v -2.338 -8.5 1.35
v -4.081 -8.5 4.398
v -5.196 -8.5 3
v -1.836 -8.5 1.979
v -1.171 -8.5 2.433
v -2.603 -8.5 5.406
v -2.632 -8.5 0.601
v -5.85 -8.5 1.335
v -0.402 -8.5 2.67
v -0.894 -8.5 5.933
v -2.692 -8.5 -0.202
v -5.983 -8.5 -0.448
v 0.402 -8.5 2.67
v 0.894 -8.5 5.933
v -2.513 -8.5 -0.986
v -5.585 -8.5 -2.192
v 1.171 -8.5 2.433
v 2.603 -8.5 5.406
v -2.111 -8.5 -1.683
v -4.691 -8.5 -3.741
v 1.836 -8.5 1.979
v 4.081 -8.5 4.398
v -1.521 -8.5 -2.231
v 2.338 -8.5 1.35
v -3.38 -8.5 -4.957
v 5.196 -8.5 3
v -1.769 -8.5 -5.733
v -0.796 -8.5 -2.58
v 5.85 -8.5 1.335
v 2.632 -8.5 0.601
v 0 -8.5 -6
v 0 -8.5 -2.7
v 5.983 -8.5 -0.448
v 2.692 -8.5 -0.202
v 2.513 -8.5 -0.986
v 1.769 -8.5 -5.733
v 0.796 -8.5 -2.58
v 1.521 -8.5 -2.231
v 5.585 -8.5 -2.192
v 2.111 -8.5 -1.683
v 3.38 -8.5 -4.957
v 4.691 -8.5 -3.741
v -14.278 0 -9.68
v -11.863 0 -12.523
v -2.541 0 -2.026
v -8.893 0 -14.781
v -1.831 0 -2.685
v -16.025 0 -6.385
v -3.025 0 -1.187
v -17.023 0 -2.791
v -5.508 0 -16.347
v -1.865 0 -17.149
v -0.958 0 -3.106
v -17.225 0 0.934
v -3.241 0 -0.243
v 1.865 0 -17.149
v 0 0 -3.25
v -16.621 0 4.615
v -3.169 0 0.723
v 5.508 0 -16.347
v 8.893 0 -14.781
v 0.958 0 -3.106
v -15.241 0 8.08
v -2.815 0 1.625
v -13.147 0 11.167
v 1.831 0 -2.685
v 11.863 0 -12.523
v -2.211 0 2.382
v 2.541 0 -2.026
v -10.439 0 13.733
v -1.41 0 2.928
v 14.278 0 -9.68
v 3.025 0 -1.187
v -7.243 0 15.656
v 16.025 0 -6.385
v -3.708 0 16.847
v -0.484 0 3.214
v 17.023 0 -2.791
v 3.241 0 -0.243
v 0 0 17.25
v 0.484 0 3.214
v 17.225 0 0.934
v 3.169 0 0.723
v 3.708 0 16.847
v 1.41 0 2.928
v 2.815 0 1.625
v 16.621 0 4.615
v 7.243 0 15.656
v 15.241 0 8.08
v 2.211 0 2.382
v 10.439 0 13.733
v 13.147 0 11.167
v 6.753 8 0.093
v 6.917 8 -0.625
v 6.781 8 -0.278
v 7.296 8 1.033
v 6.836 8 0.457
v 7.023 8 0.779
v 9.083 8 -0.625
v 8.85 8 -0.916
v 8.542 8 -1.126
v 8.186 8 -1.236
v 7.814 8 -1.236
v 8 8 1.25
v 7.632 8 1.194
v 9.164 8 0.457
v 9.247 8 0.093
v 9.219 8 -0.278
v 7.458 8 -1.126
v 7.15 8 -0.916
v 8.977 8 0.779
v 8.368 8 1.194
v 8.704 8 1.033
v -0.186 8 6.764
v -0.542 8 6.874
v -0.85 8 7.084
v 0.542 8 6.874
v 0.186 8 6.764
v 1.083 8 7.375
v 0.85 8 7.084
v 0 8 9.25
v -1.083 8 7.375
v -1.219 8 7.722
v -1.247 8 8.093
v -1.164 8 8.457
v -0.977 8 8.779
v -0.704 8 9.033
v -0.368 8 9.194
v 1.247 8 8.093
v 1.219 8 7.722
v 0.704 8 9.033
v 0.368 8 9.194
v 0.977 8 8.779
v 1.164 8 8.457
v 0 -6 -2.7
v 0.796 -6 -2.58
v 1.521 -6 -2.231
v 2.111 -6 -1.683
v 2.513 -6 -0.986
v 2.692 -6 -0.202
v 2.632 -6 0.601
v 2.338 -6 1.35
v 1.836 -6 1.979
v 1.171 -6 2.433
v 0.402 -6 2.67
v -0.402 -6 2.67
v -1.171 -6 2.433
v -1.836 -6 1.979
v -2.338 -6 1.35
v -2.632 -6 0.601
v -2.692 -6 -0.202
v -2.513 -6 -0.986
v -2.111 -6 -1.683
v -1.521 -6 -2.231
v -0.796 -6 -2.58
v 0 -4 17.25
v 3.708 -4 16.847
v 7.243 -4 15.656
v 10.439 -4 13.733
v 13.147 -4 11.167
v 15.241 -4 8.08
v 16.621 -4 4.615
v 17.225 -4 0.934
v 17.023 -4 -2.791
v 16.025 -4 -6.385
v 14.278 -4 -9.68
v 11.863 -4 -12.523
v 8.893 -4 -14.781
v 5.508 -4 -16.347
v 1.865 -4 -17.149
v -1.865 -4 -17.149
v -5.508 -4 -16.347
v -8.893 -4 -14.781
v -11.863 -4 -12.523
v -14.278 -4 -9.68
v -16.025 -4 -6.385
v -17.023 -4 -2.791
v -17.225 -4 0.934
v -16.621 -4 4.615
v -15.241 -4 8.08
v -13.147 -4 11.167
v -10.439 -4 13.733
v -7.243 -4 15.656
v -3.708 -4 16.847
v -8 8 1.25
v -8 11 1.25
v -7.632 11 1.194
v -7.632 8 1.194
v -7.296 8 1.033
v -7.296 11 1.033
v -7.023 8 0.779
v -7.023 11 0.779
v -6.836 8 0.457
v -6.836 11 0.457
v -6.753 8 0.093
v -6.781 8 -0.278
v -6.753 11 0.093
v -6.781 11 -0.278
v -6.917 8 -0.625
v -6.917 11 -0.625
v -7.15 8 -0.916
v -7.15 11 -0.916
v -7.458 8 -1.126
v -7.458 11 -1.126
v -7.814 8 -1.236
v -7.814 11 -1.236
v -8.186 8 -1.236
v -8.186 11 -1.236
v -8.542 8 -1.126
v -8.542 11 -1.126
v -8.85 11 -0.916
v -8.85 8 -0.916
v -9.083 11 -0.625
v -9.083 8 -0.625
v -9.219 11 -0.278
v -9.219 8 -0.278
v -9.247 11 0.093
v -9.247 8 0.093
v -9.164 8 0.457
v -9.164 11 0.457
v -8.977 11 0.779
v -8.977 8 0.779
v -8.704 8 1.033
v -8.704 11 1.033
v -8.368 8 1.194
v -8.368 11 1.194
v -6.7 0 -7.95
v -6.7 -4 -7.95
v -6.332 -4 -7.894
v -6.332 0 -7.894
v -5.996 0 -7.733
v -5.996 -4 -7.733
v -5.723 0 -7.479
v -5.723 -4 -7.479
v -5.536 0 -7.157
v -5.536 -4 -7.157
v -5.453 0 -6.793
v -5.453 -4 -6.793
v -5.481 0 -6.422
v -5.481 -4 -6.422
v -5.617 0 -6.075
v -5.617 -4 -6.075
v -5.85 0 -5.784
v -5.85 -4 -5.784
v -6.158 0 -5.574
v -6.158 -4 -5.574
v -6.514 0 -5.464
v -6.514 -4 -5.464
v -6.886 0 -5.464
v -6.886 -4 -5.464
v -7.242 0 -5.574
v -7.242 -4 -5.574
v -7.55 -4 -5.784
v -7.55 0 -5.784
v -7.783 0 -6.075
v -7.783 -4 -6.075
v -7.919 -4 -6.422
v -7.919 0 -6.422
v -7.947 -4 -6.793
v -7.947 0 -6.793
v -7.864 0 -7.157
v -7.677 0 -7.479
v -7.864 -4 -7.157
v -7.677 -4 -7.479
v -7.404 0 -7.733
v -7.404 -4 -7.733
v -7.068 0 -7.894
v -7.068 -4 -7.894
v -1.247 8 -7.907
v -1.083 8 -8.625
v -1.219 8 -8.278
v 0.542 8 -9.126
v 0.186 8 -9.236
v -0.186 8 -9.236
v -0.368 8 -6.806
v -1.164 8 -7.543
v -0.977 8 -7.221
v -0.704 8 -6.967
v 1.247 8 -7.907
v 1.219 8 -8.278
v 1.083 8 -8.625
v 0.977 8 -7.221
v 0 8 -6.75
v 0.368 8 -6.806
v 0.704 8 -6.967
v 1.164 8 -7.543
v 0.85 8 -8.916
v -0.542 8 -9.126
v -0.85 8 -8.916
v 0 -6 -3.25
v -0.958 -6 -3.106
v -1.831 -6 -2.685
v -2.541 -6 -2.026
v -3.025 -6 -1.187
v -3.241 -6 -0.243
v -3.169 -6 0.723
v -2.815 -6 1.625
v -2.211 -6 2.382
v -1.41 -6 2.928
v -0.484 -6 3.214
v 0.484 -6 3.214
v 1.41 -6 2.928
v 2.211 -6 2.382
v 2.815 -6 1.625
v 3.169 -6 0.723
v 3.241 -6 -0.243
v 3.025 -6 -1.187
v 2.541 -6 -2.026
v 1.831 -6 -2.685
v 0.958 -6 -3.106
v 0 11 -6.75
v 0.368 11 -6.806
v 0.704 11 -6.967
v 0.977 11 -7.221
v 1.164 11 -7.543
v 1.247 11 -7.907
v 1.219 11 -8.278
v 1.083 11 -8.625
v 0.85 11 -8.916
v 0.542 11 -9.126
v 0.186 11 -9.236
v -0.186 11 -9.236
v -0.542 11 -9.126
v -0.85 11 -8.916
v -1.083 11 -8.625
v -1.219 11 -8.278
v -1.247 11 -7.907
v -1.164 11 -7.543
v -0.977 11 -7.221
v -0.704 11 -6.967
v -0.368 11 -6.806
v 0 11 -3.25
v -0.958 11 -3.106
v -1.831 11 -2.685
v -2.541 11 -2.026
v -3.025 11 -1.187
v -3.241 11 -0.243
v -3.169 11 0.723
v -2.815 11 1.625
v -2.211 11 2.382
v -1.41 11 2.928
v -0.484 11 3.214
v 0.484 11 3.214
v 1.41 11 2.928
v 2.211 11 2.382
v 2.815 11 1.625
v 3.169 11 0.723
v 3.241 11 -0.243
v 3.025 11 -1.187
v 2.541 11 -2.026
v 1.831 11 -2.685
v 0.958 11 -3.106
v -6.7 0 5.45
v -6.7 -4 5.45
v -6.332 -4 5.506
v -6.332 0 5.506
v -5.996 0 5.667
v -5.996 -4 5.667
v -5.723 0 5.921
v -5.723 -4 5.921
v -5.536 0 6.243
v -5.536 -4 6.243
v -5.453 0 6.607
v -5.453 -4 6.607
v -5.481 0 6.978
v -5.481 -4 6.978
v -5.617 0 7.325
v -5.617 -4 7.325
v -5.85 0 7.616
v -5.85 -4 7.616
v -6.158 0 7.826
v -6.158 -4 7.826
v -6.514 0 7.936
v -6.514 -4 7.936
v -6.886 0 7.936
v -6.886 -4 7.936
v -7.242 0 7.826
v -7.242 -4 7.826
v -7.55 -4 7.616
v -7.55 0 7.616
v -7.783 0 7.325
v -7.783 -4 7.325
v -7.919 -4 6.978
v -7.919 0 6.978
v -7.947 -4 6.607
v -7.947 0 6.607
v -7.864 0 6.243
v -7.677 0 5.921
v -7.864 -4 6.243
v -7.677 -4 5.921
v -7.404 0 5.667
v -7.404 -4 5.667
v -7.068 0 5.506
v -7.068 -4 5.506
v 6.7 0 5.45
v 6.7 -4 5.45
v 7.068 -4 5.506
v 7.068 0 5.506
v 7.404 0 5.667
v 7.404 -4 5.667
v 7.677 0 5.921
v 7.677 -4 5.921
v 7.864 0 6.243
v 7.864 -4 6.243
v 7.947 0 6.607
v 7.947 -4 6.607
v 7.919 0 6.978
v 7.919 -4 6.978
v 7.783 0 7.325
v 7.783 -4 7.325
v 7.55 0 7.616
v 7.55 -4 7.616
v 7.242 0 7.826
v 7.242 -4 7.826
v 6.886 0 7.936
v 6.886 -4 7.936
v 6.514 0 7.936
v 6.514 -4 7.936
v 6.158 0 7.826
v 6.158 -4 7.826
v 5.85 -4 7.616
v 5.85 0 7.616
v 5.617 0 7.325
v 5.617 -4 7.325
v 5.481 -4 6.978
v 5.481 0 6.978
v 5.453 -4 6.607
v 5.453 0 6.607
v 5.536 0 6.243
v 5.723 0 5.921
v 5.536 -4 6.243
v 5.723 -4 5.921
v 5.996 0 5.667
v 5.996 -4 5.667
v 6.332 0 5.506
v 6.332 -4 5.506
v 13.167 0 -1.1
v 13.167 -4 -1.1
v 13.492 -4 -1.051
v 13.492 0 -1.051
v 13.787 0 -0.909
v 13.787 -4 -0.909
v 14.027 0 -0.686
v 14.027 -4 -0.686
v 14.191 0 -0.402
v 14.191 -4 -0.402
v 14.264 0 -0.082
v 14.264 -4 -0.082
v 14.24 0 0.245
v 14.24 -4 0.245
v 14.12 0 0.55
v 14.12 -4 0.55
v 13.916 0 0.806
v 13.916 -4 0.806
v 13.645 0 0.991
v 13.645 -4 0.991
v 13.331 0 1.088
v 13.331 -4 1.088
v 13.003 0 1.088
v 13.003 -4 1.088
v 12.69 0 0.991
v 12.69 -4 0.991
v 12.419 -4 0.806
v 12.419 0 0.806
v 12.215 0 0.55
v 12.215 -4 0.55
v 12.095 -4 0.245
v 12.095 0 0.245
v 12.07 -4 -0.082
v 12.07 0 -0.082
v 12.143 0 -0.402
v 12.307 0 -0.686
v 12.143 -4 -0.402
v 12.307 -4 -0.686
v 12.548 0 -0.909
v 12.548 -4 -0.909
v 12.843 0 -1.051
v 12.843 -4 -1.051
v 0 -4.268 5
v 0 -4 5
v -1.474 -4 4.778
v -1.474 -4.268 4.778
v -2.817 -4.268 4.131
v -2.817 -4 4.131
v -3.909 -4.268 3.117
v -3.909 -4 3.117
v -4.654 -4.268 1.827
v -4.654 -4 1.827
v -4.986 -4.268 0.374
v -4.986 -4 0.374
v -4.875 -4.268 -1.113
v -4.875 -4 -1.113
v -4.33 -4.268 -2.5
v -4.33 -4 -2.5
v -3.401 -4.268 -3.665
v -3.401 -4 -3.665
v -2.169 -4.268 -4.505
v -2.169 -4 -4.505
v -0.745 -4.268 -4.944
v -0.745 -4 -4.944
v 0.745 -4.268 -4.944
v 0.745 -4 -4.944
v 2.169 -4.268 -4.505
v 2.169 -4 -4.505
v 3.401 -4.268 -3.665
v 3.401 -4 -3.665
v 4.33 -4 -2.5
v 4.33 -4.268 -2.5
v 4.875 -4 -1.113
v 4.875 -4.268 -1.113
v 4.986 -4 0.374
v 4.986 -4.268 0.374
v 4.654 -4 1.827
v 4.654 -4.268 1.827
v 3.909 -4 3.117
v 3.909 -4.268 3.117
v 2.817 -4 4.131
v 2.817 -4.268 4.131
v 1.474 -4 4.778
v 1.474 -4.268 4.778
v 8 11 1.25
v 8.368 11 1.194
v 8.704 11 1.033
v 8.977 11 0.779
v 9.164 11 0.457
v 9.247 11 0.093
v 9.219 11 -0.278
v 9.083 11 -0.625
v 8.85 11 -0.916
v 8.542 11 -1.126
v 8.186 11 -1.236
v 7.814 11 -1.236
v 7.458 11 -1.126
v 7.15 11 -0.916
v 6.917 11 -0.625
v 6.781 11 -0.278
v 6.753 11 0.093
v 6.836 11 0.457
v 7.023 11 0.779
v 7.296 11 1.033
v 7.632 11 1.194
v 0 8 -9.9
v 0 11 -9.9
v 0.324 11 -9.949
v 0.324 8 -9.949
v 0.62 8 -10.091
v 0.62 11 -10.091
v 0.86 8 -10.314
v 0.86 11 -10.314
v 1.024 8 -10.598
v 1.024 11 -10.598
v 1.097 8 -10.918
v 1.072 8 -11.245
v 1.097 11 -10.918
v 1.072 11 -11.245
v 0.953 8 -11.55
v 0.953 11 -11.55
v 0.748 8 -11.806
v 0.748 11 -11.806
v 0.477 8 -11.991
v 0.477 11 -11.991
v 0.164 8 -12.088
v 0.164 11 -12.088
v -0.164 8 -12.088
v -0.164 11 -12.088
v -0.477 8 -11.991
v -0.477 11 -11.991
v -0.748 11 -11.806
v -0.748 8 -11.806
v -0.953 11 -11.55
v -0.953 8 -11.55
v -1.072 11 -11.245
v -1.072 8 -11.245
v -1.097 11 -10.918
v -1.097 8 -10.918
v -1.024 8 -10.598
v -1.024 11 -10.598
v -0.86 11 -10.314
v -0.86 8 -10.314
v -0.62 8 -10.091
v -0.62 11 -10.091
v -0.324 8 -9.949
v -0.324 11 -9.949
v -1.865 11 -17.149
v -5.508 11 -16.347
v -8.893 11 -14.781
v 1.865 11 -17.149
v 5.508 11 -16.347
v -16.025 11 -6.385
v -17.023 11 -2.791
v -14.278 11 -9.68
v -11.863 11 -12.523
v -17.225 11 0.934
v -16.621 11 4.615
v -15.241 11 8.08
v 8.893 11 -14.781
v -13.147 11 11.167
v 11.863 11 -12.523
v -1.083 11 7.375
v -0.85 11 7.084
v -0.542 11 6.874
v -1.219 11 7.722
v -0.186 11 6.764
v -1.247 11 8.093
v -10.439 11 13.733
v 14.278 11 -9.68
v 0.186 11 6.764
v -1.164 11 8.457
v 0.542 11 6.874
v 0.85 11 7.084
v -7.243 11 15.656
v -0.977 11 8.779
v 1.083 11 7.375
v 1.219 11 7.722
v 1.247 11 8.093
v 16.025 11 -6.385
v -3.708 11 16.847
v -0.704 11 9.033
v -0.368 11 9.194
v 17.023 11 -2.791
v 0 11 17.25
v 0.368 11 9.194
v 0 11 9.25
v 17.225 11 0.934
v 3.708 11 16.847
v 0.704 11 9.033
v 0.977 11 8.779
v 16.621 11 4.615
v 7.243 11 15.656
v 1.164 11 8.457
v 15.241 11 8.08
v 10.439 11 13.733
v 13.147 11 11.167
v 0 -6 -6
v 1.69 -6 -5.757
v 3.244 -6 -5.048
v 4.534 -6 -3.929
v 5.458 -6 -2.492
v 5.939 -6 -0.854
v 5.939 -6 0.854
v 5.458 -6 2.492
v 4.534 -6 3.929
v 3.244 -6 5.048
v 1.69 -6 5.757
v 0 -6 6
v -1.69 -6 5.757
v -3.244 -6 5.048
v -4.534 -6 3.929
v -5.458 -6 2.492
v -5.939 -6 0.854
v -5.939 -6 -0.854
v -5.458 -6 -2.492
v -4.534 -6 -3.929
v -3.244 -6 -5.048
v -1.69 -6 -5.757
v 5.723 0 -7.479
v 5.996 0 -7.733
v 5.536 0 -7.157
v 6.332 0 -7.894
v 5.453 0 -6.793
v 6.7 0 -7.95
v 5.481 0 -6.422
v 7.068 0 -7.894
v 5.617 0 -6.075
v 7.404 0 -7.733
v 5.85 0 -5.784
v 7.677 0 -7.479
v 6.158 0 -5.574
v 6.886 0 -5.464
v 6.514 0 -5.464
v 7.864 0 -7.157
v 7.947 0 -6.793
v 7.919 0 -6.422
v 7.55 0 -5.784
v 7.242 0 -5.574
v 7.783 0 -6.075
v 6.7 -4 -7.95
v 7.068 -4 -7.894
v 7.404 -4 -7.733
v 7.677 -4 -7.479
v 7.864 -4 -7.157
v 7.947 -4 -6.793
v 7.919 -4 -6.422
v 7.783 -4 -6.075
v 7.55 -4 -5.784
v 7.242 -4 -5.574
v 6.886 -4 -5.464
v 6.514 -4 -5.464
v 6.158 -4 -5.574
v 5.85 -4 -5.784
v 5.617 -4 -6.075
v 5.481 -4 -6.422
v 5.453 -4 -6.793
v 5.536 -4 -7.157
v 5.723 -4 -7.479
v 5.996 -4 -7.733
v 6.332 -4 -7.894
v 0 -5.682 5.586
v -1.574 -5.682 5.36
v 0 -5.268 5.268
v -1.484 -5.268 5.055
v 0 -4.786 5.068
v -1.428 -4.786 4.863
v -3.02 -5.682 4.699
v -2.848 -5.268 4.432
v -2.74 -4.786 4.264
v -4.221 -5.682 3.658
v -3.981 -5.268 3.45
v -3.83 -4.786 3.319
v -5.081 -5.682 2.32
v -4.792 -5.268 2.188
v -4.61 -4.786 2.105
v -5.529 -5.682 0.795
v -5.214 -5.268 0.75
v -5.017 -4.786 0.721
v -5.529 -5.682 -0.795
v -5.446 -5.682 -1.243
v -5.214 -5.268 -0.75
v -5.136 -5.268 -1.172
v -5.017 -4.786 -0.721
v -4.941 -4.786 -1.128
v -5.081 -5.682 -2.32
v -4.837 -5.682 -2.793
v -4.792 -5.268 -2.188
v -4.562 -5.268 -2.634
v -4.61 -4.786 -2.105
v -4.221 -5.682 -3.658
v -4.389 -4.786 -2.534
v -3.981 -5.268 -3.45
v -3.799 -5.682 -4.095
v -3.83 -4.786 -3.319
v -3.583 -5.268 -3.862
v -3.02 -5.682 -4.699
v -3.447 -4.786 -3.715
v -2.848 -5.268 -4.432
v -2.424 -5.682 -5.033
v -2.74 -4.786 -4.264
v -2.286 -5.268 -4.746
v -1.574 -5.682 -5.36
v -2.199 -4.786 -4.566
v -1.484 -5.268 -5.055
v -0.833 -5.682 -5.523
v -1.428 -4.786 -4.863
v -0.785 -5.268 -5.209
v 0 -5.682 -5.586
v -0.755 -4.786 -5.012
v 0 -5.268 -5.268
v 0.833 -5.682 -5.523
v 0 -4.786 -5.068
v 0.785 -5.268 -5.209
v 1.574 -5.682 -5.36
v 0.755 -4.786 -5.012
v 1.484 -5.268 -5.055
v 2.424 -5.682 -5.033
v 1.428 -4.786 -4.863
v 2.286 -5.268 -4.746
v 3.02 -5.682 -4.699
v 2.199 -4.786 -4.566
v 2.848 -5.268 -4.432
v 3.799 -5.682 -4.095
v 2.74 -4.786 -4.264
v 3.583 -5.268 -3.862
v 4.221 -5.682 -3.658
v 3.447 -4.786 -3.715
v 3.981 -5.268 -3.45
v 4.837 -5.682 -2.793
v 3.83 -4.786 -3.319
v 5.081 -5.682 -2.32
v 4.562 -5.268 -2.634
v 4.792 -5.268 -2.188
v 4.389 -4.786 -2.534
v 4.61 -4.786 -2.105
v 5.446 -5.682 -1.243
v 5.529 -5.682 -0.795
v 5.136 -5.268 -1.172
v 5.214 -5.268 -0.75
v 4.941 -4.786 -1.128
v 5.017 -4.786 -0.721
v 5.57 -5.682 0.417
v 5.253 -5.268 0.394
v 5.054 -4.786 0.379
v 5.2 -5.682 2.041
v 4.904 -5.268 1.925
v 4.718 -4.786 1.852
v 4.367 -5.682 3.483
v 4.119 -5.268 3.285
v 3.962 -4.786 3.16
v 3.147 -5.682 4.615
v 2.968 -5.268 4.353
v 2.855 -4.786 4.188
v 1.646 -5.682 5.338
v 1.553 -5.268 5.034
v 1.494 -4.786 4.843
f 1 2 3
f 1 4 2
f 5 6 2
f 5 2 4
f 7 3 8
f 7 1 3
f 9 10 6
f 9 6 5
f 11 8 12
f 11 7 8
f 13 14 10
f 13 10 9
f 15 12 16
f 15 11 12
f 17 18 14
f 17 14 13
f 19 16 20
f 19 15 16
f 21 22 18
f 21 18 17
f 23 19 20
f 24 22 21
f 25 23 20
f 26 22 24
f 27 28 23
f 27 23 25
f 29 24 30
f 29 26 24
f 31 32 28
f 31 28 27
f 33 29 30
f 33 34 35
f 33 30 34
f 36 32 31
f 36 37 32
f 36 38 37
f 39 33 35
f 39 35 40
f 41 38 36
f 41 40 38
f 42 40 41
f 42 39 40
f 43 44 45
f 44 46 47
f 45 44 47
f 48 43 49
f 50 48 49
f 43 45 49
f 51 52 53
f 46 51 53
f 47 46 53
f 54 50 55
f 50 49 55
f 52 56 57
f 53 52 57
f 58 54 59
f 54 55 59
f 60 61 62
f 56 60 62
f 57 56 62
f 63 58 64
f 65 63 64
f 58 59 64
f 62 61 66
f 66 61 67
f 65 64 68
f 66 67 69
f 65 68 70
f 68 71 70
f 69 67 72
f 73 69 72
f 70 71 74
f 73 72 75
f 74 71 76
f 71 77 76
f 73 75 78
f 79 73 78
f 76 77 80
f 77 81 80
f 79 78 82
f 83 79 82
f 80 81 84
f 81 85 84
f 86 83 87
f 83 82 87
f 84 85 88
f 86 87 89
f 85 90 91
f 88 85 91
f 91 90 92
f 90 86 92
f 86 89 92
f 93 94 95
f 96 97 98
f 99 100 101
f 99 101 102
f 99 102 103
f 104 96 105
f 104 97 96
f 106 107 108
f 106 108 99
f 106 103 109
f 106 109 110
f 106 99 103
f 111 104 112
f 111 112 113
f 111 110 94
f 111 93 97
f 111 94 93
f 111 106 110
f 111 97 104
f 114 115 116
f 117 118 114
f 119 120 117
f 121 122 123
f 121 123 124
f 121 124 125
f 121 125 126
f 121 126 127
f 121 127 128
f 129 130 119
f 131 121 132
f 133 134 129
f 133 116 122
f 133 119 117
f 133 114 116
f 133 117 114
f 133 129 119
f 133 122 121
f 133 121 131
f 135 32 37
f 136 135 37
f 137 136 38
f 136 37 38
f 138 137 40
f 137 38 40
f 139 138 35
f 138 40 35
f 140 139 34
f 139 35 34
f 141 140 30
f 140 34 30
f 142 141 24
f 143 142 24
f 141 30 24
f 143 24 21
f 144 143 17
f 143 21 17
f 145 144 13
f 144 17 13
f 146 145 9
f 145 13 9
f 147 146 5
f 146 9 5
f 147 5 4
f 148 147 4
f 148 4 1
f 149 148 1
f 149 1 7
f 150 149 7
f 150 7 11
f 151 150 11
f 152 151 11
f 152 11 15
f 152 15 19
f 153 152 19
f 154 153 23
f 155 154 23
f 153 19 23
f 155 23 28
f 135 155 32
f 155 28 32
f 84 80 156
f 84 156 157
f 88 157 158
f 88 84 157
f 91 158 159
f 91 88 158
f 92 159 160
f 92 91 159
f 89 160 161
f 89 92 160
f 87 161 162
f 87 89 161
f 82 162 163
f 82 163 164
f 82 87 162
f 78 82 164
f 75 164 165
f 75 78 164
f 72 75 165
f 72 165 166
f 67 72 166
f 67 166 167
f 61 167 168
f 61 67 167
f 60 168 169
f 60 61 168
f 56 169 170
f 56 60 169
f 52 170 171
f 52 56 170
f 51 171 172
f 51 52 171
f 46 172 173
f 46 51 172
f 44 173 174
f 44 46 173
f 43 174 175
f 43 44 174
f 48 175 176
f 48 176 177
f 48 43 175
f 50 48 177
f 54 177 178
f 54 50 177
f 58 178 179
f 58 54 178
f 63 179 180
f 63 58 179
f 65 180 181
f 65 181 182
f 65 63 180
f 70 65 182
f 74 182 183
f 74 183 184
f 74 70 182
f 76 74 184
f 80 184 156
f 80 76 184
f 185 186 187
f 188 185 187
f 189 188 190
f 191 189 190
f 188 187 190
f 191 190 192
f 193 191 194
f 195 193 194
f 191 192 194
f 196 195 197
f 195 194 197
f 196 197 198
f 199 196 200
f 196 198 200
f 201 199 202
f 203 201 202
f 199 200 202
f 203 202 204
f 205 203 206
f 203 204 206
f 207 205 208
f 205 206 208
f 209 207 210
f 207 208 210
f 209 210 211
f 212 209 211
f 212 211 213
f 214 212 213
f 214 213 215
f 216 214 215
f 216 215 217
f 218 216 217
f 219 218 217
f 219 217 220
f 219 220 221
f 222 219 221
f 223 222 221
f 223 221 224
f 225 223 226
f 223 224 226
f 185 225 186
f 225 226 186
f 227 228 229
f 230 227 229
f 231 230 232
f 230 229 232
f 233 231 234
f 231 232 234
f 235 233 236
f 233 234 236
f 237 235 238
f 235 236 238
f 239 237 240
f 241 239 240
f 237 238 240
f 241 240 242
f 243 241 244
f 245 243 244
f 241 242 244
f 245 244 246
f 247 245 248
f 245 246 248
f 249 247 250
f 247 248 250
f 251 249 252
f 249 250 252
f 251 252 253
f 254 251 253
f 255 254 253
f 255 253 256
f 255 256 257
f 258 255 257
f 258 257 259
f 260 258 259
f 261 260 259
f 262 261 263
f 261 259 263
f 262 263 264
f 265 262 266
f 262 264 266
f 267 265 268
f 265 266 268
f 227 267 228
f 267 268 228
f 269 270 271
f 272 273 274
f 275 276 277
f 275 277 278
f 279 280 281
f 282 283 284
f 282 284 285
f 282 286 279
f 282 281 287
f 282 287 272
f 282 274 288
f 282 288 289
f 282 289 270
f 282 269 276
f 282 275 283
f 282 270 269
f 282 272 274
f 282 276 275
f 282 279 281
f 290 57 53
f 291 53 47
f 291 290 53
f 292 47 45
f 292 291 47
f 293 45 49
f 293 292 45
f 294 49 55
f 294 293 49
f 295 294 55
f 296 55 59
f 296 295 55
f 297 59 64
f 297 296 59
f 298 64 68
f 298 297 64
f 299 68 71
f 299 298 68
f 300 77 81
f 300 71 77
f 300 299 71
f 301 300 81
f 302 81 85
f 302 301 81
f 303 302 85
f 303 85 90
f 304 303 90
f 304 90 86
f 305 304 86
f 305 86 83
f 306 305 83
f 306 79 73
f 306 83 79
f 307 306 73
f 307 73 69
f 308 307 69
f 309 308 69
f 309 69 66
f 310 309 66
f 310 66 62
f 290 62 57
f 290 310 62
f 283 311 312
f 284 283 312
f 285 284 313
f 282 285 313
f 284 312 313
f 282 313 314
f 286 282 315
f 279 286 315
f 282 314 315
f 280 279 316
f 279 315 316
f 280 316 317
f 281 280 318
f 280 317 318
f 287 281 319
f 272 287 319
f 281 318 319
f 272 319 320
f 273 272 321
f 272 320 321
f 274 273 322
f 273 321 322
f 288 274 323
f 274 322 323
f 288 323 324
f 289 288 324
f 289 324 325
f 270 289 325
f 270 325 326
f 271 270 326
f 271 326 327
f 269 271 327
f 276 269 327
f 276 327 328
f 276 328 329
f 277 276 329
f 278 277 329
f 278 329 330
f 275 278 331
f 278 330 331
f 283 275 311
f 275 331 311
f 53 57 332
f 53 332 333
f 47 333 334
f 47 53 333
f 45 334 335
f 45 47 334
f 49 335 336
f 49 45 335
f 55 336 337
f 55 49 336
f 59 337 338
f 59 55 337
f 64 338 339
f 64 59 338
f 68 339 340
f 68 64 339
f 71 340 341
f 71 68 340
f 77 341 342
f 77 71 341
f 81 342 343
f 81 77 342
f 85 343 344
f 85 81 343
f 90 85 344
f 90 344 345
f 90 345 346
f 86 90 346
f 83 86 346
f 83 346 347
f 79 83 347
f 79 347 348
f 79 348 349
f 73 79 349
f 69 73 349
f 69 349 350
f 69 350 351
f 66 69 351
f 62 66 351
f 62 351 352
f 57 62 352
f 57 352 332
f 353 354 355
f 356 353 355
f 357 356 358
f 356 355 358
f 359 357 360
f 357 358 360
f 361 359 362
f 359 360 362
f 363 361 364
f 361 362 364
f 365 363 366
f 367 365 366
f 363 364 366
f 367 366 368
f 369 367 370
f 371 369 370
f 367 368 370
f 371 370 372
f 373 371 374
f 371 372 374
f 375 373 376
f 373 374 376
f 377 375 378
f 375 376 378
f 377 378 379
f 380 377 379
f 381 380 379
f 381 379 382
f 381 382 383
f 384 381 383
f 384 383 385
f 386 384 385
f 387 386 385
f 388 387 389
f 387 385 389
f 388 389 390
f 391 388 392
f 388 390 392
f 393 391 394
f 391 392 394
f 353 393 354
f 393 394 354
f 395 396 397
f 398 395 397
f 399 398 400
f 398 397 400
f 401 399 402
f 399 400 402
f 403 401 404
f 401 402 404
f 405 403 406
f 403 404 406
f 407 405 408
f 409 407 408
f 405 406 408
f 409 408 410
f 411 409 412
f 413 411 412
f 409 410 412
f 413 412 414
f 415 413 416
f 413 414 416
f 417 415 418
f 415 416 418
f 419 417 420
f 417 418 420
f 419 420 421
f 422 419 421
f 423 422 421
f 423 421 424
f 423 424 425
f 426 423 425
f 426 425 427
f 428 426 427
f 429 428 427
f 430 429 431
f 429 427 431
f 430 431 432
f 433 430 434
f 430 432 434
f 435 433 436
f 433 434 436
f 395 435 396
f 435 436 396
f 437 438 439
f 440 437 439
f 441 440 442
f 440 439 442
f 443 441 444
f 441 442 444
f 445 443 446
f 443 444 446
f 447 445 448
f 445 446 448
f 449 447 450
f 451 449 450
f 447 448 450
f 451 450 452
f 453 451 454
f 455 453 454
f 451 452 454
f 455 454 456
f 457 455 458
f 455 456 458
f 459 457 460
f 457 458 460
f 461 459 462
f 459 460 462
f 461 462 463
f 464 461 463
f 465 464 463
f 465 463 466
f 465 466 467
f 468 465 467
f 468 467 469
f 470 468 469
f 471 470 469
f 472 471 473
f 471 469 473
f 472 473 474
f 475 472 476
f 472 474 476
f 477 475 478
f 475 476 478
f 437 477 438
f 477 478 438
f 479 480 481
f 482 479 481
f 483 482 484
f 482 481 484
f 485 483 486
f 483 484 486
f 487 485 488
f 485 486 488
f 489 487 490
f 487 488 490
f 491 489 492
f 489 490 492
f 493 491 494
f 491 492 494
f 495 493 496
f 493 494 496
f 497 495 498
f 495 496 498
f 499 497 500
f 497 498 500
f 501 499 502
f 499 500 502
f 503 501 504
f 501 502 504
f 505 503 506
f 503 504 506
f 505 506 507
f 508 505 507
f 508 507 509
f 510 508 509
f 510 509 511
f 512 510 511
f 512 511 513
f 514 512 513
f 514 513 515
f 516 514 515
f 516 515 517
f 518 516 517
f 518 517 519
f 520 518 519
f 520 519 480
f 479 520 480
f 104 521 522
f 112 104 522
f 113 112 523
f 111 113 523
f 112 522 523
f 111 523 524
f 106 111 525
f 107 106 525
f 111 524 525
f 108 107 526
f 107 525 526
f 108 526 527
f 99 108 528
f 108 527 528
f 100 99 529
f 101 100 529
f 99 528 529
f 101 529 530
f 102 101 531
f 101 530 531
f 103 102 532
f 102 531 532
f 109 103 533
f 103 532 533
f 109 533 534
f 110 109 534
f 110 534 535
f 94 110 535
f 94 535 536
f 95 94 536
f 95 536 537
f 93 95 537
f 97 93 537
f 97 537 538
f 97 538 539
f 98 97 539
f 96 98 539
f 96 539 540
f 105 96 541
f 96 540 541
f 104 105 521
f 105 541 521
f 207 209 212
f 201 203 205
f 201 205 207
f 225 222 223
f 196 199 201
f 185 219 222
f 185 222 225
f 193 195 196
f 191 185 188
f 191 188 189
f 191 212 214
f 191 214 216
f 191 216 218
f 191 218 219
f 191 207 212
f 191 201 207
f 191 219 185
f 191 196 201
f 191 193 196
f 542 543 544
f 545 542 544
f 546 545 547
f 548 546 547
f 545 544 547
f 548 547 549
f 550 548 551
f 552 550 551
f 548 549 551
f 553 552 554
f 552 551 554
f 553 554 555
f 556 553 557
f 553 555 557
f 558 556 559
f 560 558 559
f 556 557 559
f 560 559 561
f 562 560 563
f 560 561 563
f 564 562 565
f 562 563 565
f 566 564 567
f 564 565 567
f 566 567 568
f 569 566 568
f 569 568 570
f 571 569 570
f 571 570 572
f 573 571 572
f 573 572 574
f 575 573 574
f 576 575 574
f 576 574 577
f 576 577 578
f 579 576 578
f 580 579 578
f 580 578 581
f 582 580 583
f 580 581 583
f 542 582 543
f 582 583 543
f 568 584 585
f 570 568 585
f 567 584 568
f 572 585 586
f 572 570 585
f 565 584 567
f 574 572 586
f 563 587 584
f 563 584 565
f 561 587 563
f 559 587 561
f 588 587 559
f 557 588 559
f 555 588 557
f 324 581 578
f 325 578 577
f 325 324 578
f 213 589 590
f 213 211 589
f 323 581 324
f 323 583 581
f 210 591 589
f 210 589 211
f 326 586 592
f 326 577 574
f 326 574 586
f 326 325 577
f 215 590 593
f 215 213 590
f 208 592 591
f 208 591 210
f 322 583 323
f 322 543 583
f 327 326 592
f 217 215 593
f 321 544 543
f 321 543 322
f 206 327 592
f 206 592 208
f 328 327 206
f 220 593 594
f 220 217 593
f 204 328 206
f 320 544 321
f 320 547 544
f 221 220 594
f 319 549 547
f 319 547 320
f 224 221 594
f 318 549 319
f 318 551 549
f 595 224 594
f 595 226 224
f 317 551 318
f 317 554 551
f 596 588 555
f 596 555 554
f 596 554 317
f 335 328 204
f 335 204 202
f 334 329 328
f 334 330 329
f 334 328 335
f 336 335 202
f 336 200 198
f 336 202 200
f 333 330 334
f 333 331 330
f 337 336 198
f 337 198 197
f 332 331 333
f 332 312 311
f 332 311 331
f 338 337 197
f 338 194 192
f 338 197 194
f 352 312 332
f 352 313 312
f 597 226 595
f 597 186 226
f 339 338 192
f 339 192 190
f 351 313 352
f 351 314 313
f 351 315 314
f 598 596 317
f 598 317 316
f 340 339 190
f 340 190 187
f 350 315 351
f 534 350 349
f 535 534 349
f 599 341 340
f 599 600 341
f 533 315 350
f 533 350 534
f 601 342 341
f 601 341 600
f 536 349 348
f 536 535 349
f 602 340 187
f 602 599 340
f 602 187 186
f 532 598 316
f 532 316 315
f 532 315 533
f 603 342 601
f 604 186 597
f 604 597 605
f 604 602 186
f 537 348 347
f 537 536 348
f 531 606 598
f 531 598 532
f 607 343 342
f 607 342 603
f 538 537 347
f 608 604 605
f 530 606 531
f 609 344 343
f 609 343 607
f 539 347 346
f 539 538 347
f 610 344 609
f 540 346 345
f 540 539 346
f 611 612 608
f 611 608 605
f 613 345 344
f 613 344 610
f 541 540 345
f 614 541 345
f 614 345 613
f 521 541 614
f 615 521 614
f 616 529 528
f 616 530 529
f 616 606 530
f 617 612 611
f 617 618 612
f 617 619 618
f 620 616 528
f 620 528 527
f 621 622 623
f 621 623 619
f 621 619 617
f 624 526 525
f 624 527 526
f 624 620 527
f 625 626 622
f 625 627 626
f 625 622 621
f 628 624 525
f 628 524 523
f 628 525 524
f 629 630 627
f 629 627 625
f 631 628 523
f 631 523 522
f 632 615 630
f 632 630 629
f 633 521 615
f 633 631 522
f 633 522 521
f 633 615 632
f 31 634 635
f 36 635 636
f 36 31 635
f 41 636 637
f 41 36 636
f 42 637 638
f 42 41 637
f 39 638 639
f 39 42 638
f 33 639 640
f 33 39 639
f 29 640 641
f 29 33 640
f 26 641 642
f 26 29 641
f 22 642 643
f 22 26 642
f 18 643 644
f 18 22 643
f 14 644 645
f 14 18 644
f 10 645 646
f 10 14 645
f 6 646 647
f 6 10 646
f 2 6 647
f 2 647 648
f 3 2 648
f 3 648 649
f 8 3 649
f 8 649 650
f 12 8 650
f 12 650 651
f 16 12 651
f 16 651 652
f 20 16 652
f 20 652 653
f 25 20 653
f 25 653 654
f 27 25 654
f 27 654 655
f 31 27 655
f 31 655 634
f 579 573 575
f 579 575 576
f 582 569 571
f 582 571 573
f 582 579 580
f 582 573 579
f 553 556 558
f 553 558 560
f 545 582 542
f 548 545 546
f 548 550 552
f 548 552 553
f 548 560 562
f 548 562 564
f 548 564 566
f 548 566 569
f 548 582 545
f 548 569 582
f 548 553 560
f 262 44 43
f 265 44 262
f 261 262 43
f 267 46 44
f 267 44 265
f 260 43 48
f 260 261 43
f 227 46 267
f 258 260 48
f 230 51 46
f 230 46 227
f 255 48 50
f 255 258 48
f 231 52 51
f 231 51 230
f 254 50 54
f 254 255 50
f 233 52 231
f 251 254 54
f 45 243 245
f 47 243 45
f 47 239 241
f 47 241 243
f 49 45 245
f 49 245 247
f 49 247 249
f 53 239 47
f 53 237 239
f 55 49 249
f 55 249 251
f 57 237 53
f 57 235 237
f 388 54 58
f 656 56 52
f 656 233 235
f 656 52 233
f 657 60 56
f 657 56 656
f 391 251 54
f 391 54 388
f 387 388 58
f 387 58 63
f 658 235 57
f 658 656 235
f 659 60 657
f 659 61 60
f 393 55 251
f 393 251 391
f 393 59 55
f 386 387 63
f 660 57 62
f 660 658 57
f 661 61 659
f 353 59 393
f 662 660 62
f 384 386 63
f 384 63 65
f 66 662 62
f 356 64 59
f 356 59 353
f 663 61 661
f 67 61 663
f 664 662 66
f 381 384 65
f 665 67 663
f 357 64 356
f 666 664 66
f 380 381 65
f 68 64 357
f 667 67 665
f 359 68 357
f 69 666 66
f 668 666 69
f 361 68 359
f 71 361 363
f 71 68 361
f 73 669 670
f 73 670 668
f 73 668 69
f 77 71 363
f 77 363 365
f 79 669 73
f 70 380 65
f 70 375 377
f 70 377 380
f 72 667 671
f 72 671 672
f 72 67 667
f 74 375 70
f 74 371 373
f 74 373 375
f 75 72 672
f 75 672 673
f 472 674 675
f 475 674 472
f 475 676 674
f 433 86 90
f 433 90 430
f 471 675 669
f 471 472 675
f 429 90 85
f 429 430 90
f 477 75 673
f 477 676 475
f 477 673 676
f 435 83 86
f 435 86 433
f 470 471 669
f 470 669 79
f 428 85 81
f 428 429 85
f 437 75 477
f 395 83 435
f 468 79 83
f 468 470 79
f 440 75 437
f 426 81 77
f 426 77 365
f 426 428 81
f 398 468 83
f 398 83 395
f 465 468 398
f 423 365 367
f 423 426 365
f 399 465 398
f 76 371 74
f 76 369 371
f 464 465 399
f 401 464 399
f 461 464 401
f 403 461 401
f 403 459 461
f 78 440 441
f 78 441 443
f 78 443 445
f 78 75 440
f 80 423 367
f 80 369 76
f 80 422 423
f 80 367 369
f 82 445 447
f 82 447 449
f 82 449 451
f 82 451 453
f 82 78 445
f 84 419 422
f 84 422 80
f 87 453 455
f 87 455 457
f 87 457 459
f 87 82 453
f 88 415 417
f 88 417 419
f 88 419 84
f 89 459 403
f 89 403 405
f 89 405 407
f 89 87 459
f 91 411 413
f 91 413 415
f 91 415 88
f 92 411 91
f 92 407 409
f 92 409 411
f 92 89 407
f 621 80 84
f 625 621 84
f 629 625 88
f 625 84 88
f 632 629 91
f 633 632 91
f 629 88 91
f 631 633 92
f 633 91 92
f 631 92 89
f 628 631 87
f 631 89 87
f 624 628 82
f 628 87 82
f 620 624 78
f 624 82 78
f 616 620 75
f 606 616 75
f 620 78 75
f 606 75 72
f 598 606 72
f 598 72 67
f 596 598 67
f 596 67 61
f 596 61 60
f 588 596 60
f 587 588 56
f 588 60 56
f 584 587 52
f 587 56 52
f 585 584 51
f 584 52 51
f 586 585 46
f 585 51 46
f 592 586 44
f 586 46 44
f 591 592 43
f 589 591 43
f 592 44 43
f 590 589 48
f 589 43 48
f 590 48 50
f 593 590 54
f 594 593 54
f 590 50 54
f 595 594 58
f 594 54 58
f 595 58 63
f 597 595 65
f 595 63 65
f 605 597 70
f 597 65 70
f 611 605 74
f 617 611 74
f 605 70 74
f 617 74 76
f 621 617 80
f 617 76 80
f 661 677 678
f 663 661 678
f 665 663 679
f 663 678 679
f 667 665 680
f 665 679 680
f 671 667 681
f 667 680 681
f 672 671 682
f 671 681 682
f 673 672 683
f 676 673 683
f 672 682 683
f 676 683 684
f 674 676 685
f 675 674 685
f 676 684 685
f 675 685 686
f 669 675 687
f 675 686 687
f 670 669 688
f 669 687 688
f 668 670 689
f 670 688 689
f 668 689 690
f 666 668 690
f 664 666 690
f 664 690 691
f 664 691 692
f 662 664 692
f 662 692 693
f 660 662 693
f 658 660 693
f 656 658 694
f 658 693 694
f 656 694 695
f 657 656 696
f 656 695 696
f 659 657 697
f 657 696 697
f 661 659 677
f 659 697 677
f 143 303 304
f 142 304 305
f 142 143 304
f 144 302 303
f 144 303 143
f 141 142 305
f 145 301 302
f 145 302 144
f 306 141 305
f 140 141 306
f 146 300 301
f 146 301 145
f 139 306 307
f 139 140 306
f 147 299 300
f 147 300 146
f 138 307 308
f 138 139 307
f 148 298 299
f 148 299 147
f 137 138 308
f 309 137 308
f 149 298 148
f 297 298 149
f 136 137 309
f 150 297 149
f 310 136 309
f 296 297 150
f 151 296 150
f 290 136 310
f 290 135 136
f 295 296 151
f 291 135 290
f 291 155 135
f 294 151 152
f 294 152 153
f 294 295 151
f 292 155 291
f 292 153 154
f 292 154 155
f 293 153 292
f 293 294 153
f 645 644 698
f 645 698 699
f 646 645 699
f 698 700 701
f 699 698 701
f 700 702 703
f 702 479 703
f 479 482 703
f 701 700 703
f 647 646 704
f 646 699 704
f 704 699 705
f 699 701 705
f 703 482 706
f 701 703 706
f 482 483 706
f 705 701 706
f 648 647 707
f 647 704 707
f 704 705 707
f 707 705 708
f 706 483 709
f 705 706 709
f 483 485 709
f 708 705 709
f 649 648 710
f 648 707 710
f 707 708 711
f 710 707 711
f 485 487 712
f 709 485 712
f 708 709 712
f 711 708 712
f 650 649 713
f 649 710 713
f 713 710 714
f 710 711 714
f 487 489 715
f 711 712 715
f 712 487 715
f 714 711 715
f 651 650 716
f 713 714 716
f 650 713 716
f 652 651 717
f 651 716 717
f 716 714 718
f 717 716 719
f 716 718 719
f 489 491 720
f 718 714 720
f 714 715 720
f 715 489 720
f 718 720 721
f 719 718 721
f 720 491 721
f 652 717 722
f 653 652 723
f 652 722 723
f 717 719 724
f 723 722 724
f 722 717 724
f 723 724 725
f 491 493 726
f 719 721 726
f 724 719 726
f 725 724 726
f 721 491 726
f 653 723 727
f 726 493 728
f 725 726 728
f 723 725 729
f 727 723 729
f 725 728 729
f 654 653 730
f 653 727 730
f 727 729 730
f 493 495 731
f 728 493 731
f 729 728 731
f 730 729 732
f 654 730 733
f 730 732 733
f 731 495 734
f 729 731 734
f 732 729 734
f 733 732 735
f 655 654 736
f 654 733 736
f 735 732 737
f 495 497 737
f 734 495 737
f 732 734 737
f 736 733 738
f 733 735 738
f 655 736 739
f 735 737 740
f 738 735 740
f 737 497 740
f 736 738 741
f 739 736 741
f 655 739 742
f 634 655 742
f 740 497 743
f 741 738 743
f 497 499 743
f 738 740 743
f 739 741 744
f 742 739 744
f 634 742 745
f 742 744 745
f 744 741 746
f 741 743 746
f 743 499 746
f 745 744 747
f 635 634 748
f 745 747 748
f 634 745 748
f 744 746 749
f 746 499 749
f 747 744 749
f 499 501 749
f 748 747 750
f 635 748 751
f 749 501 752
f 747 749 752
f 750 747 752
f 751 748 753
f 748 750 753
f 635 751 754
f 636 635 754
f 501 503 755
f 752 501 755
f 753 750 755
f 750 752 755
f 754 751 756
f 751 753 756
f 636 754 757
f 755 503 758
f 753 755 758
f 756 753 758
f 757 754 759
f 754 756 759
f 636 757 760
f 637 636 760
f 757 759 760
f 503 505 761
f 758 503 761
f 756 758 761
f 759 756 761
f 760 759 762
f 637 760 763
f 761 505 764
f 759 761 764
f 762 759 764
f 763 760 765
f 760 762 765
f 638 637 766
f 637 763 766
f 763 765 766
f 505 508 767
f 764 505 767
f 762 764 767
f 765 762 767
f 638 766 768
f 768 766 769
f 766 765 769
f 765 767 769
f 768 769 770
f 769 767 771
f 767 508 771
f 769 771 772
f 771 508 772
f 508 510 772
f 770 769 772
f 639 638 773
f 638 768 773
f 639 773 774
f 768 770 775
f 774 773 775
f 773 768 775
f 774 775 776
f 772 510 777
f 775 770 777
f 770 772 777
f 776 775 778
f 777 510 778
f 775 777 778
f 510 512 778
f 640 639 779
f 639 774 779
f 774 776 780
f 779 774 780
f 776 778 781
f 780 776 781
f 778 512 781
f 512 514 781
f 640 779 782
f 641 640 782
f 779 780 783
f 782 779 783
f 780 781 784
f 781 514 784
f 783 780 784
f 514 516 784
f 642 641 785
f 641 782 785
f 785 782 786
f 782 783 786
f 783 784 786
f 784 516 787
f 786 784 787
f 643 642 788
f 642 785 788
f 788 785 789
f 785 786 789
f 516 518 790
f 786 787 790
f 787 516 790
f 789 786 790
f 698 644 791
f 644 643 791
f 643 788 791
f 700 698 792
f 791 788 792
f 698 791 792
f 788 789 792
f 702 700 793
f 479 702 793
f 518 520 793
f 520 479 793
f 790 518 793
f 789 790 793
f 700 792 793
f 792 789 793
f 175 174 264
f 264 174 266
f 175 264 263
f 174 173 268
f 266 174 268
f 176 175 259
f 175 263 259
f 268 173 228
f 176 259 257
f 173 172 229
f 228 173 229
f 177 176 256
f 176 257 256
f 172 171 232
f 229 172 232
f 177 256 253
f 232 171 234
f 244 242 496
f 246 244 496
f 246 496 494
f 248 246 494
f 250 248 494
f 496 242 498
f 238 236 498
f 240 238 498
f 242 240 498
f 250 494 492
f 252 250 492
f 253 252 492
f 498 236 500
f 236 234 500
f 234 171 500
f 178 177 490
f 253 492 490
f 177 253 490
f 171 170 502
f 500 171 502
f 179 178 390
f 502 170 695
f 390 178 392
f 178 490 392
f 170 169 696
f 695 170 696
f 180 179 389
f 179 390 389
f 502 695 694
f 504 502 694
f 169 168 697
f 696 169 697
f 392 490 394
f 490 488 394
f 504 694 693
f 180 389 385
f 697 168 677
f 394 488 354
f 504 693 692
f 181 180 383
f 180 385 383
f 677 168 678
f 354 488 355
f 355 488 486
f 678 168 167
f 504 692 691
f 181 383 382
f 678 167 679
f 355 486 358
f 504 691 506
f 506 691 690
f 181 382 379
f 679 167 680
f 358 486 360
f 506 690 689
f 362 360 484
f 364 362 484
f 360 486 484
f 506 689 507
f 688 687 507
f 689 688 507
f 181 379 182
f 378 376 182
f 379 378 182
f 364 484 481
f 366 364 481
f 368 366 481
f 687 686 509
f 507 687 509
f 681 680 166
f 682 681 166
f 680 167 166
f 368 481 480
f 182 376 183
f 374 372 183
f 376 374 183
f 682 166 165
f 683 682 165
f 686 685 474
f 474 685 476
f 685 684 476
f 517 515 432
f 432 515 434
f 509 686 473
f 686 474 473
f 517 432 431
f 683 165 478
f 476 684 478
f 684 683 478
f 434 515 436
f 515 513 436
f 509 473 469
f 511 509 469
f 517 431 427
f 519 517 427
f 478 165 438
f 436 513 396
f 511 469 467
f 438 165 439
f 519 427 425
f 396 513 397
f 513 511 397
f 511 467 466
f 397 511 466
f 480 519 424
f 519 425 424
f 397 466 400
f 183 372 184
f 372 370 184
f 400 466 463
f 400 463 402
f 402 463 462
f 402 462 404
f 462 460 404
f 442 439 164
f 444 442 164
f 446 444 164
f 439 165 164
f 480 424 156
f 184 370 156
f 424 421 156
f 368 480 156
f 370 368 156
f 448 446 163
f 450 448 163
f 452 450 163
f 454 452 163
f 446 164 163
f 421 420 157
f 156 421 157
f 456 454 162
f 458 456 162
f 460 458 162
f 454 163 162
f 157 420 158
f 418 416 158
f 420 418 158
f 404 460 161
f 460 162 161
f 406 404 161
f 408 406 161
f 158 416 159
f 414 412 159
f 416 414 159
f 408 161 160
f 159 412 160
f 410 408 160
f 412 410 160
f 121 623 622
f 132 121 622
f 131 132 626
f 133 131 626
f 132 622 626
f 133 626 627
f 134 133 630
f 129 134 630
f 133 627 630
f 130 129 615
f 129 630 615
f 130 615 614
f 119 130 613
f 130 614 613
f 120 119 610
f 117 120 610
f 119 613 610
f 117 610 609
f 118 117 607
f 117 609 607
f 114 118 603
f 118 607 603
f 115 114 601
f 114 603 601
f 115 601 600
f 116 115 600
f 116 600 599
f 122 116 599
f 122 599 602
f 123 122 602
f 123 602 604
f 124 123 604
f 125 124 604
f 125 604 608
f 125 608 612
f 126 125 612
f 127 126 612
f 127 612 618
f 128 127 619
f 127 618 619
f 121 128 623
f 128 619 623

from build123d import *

# Parameters (mm, degrees)
SKETCH1_R           = 17.25
BOSS_EXTRUDE1_DEPTH = 11
SKETCH2_R           = 1.25
SKETCH2_R_2         = 1.1
CUT_EXTRUDE1_DEPTH  = 3
SKETCH1_2_R         = 17.25
BOSS_EXTRUDE2_DEPTH = 4
SKETCH4_R           = 1.25
SKETCH4_R_2         = 1.1
CUT_EXTRUDE3_DEPTH  = 4
SKETCH5_R           = 5
BOSS_EXTRUDE3_DEPTH = 4.5
BOSS_EXTRUDE4_START = 4.5
SKETCH5_3_R         = 6
SKETCH5_3_R_2       = 5
BOSS_EXTRUDE4_DEPTH = 2.5
CUT_EXTRUDE4_START  = 4.5
SKETCH5_5_R         = 2.7
CUT_EXTRUDE4_DEPTH  = 2.5
CUT_EXTRUDE5_START  = -6
SKETCH6_R           = 3.25
CUT_EXTRUDE5_DEPTH  = 17
FILLET1_R           = 2


with BuildPart() as part:
    # Sketch1 → Boss-Extrude1 (new body)
    with BuildSketch(Plane(origin=(0, 0, 0), x_dir=(1, 0, 0), z_dir=(0, 1, 0))):
        with Locations(Location((0, 0, 0), (0, 0, 270))):
            Circle(SKETCH1_R)
    extrude(amount=BOSS_EXTRUDE1_DEPTH)

    # Sketch2 → Cut-Extrude1 (cut)
    with BuildSketch(Plane(origin=(0, 11, 0), x_dir=(1, 0, 0), z_dir=(0, 1, 0))):
        with Locations(Location((0, 8, 0), (0, 0, 270))):
            Circle(SKETCH2_R)
        with Locations(Location((0, 11, 0), (0, 0, 270))):
            Circle(SKETCH2_R_2)
        with Locations(Location((8, 0, 0), (0, 0, 270))):
            Circle(SKETCH2_R)
        with Locations(Location((0, -8, 0), (0, 0, 270))):
            Circle(SKETCH2_R)
        with Locations(Location((-8, 0, 0), (0, 0, 270))):
            Circle(SKETCH2_R)
    extrude(amount=-CUT_EXTRUDE1_DEPTH, mode=Mode.SUBTRACT)


with BuildPart() as body_2:
    # Sketch1<2> → Boss-Extrude2 (new body)
    with BuildSketch(Plane(origin=(0, 0, 0), x_dir=(1, 0, 0), z_dir=(0, 1, 0))):
        with Locations(Location((0, 0, 0), (0, 0, 270))):
            Circle(SKETCH1_2_R)
    extrude(amount=-BOSS_EXTRUDE2_DEPTH)

    # Sketch4 → Cut-Extrude3 (cut)
    with BuildSketch(Plane.XZ.offset(4)):
        with Locations(Location((-6.7, 6.7, 0), (0, 0, 270))):
            Circle(SKETCH4_R)
        with Locations(Location((6.7, 6.7, 0), (0, 0, 270))):
            Circle(SKETCH4_R)
        with Locations(Location((6.7, -6.7, 0), (0, 0, 270))):
            Circle(SKETCH4_R)
        with Locations(Location((-6.7, -6.7, 0), (0, 0, 270))):
            Circle(SKETCH4_R)
        with Locations(Location((13.167391572, 0, 0), (0, 0, 270))):
            Circle(SKETCH4_R_2)
    extrude(amount=-CUT_EXTRUDE3_DEPTH, mode=Mode.SUBTRACT)

    # Sketch5 → Boss-Extrude3 (add)
    with BuildSketch(Plane.XZ.offset(4)):
        with Locations(Location((0, 0, 0), (0, 0, 90))):
            Circle(SKETCH5_R)
    extrude(amount=BOSS_EXTRUDE3_DEPTH)

    # Sketch5<3> → Boss-Extrude4 (add)
    with BuildSketch(Plane.XZ.offset(4).offset(BOSS_EXTRUDE4_START)):
        with Locations(Location((0, 0, 0), (0, 0, 270))):
            Circle(SKETCH5_3_R)
        with Locations(Location((0, 0, 0), (0, 0, 90))):
            Circle(SKETCH5_3_R_2, mode=Mode.SUBTRACT)
    extrude(amount=-BOSS_EXTRUDE4_DEPTH)

    # Sketch5<5> → Cut-Extrude4 (cut)
    with BuildSketch(Plane.XZ.offset(4).offset(CUT_EXTRUDE4_START)):
        with Locations(Location((0, 0, 0), (0, 0, 270))):
            Circle(SKETCH5_5_R)
    extrude(amount=-CUT_EXTRUDE4_DEPTH, mode=Mode.SUBTRACT)


with BuildPart() as cut_extrude5_tool:
    # Sketch6 → Cut-Extrude5 (new body)
    with BuildSketch(Plane(origin=(0, 0, 0), x_dir=(1, 0, 0), z_dir=(0, 1, 0)).offset(CUT_EXTRUDE5_START)):
        with Locations(Location((0, 0, 0), (0, 0, 90))):
            Circle(SKETCH6_R)
    extrude(amount=CUT_EXTRUDE5_DEPTH)


with BuildPart() as part_1:
    add(part.part)

    # Cut-Extrude5: cut by cut_extrude5_tool
    add(cut_extrude5_tool.part, mode=Mode.SUBTRACT)


with BuildPart() as body_2_1:
    add(body_2.part)

    # Cut-Extrude5: cut by cut_extrude5_tool
    add(cut_extrude5_tool.part, mode=Mode.SUBTRACT)

    # Fillet1
    # the kernel refuses this fillet: 2 mm, written as the material it adds along each edge
    with BuildSketch(Plane(origin=(0, -6, 0), x_dir=(0, 0, 1), z_dir=(1, 0, 0))) as fillet1_piece_1:
        with BuildLine():
            CenterArc((7, -1.732050808), FILLET1_R, 120, 60)
            Line((6, 0), (5.98, 0.034641016))
            ThreePointArc((5.98, 0.034641016), (5.5, 0.04), (5, 0.04))
            Line((5, 0.04), (4.96, 0))
            Line((4.96, 0), (4.96, -1.732050808))
            Line((4.96, -1.732050808), (5, -1.732050808))
        make_face()
    revolve(axis=Axis((0, -6, 0), (0, -1, 0)))


solid = Compound([part_1.part, body_2_1.part])
